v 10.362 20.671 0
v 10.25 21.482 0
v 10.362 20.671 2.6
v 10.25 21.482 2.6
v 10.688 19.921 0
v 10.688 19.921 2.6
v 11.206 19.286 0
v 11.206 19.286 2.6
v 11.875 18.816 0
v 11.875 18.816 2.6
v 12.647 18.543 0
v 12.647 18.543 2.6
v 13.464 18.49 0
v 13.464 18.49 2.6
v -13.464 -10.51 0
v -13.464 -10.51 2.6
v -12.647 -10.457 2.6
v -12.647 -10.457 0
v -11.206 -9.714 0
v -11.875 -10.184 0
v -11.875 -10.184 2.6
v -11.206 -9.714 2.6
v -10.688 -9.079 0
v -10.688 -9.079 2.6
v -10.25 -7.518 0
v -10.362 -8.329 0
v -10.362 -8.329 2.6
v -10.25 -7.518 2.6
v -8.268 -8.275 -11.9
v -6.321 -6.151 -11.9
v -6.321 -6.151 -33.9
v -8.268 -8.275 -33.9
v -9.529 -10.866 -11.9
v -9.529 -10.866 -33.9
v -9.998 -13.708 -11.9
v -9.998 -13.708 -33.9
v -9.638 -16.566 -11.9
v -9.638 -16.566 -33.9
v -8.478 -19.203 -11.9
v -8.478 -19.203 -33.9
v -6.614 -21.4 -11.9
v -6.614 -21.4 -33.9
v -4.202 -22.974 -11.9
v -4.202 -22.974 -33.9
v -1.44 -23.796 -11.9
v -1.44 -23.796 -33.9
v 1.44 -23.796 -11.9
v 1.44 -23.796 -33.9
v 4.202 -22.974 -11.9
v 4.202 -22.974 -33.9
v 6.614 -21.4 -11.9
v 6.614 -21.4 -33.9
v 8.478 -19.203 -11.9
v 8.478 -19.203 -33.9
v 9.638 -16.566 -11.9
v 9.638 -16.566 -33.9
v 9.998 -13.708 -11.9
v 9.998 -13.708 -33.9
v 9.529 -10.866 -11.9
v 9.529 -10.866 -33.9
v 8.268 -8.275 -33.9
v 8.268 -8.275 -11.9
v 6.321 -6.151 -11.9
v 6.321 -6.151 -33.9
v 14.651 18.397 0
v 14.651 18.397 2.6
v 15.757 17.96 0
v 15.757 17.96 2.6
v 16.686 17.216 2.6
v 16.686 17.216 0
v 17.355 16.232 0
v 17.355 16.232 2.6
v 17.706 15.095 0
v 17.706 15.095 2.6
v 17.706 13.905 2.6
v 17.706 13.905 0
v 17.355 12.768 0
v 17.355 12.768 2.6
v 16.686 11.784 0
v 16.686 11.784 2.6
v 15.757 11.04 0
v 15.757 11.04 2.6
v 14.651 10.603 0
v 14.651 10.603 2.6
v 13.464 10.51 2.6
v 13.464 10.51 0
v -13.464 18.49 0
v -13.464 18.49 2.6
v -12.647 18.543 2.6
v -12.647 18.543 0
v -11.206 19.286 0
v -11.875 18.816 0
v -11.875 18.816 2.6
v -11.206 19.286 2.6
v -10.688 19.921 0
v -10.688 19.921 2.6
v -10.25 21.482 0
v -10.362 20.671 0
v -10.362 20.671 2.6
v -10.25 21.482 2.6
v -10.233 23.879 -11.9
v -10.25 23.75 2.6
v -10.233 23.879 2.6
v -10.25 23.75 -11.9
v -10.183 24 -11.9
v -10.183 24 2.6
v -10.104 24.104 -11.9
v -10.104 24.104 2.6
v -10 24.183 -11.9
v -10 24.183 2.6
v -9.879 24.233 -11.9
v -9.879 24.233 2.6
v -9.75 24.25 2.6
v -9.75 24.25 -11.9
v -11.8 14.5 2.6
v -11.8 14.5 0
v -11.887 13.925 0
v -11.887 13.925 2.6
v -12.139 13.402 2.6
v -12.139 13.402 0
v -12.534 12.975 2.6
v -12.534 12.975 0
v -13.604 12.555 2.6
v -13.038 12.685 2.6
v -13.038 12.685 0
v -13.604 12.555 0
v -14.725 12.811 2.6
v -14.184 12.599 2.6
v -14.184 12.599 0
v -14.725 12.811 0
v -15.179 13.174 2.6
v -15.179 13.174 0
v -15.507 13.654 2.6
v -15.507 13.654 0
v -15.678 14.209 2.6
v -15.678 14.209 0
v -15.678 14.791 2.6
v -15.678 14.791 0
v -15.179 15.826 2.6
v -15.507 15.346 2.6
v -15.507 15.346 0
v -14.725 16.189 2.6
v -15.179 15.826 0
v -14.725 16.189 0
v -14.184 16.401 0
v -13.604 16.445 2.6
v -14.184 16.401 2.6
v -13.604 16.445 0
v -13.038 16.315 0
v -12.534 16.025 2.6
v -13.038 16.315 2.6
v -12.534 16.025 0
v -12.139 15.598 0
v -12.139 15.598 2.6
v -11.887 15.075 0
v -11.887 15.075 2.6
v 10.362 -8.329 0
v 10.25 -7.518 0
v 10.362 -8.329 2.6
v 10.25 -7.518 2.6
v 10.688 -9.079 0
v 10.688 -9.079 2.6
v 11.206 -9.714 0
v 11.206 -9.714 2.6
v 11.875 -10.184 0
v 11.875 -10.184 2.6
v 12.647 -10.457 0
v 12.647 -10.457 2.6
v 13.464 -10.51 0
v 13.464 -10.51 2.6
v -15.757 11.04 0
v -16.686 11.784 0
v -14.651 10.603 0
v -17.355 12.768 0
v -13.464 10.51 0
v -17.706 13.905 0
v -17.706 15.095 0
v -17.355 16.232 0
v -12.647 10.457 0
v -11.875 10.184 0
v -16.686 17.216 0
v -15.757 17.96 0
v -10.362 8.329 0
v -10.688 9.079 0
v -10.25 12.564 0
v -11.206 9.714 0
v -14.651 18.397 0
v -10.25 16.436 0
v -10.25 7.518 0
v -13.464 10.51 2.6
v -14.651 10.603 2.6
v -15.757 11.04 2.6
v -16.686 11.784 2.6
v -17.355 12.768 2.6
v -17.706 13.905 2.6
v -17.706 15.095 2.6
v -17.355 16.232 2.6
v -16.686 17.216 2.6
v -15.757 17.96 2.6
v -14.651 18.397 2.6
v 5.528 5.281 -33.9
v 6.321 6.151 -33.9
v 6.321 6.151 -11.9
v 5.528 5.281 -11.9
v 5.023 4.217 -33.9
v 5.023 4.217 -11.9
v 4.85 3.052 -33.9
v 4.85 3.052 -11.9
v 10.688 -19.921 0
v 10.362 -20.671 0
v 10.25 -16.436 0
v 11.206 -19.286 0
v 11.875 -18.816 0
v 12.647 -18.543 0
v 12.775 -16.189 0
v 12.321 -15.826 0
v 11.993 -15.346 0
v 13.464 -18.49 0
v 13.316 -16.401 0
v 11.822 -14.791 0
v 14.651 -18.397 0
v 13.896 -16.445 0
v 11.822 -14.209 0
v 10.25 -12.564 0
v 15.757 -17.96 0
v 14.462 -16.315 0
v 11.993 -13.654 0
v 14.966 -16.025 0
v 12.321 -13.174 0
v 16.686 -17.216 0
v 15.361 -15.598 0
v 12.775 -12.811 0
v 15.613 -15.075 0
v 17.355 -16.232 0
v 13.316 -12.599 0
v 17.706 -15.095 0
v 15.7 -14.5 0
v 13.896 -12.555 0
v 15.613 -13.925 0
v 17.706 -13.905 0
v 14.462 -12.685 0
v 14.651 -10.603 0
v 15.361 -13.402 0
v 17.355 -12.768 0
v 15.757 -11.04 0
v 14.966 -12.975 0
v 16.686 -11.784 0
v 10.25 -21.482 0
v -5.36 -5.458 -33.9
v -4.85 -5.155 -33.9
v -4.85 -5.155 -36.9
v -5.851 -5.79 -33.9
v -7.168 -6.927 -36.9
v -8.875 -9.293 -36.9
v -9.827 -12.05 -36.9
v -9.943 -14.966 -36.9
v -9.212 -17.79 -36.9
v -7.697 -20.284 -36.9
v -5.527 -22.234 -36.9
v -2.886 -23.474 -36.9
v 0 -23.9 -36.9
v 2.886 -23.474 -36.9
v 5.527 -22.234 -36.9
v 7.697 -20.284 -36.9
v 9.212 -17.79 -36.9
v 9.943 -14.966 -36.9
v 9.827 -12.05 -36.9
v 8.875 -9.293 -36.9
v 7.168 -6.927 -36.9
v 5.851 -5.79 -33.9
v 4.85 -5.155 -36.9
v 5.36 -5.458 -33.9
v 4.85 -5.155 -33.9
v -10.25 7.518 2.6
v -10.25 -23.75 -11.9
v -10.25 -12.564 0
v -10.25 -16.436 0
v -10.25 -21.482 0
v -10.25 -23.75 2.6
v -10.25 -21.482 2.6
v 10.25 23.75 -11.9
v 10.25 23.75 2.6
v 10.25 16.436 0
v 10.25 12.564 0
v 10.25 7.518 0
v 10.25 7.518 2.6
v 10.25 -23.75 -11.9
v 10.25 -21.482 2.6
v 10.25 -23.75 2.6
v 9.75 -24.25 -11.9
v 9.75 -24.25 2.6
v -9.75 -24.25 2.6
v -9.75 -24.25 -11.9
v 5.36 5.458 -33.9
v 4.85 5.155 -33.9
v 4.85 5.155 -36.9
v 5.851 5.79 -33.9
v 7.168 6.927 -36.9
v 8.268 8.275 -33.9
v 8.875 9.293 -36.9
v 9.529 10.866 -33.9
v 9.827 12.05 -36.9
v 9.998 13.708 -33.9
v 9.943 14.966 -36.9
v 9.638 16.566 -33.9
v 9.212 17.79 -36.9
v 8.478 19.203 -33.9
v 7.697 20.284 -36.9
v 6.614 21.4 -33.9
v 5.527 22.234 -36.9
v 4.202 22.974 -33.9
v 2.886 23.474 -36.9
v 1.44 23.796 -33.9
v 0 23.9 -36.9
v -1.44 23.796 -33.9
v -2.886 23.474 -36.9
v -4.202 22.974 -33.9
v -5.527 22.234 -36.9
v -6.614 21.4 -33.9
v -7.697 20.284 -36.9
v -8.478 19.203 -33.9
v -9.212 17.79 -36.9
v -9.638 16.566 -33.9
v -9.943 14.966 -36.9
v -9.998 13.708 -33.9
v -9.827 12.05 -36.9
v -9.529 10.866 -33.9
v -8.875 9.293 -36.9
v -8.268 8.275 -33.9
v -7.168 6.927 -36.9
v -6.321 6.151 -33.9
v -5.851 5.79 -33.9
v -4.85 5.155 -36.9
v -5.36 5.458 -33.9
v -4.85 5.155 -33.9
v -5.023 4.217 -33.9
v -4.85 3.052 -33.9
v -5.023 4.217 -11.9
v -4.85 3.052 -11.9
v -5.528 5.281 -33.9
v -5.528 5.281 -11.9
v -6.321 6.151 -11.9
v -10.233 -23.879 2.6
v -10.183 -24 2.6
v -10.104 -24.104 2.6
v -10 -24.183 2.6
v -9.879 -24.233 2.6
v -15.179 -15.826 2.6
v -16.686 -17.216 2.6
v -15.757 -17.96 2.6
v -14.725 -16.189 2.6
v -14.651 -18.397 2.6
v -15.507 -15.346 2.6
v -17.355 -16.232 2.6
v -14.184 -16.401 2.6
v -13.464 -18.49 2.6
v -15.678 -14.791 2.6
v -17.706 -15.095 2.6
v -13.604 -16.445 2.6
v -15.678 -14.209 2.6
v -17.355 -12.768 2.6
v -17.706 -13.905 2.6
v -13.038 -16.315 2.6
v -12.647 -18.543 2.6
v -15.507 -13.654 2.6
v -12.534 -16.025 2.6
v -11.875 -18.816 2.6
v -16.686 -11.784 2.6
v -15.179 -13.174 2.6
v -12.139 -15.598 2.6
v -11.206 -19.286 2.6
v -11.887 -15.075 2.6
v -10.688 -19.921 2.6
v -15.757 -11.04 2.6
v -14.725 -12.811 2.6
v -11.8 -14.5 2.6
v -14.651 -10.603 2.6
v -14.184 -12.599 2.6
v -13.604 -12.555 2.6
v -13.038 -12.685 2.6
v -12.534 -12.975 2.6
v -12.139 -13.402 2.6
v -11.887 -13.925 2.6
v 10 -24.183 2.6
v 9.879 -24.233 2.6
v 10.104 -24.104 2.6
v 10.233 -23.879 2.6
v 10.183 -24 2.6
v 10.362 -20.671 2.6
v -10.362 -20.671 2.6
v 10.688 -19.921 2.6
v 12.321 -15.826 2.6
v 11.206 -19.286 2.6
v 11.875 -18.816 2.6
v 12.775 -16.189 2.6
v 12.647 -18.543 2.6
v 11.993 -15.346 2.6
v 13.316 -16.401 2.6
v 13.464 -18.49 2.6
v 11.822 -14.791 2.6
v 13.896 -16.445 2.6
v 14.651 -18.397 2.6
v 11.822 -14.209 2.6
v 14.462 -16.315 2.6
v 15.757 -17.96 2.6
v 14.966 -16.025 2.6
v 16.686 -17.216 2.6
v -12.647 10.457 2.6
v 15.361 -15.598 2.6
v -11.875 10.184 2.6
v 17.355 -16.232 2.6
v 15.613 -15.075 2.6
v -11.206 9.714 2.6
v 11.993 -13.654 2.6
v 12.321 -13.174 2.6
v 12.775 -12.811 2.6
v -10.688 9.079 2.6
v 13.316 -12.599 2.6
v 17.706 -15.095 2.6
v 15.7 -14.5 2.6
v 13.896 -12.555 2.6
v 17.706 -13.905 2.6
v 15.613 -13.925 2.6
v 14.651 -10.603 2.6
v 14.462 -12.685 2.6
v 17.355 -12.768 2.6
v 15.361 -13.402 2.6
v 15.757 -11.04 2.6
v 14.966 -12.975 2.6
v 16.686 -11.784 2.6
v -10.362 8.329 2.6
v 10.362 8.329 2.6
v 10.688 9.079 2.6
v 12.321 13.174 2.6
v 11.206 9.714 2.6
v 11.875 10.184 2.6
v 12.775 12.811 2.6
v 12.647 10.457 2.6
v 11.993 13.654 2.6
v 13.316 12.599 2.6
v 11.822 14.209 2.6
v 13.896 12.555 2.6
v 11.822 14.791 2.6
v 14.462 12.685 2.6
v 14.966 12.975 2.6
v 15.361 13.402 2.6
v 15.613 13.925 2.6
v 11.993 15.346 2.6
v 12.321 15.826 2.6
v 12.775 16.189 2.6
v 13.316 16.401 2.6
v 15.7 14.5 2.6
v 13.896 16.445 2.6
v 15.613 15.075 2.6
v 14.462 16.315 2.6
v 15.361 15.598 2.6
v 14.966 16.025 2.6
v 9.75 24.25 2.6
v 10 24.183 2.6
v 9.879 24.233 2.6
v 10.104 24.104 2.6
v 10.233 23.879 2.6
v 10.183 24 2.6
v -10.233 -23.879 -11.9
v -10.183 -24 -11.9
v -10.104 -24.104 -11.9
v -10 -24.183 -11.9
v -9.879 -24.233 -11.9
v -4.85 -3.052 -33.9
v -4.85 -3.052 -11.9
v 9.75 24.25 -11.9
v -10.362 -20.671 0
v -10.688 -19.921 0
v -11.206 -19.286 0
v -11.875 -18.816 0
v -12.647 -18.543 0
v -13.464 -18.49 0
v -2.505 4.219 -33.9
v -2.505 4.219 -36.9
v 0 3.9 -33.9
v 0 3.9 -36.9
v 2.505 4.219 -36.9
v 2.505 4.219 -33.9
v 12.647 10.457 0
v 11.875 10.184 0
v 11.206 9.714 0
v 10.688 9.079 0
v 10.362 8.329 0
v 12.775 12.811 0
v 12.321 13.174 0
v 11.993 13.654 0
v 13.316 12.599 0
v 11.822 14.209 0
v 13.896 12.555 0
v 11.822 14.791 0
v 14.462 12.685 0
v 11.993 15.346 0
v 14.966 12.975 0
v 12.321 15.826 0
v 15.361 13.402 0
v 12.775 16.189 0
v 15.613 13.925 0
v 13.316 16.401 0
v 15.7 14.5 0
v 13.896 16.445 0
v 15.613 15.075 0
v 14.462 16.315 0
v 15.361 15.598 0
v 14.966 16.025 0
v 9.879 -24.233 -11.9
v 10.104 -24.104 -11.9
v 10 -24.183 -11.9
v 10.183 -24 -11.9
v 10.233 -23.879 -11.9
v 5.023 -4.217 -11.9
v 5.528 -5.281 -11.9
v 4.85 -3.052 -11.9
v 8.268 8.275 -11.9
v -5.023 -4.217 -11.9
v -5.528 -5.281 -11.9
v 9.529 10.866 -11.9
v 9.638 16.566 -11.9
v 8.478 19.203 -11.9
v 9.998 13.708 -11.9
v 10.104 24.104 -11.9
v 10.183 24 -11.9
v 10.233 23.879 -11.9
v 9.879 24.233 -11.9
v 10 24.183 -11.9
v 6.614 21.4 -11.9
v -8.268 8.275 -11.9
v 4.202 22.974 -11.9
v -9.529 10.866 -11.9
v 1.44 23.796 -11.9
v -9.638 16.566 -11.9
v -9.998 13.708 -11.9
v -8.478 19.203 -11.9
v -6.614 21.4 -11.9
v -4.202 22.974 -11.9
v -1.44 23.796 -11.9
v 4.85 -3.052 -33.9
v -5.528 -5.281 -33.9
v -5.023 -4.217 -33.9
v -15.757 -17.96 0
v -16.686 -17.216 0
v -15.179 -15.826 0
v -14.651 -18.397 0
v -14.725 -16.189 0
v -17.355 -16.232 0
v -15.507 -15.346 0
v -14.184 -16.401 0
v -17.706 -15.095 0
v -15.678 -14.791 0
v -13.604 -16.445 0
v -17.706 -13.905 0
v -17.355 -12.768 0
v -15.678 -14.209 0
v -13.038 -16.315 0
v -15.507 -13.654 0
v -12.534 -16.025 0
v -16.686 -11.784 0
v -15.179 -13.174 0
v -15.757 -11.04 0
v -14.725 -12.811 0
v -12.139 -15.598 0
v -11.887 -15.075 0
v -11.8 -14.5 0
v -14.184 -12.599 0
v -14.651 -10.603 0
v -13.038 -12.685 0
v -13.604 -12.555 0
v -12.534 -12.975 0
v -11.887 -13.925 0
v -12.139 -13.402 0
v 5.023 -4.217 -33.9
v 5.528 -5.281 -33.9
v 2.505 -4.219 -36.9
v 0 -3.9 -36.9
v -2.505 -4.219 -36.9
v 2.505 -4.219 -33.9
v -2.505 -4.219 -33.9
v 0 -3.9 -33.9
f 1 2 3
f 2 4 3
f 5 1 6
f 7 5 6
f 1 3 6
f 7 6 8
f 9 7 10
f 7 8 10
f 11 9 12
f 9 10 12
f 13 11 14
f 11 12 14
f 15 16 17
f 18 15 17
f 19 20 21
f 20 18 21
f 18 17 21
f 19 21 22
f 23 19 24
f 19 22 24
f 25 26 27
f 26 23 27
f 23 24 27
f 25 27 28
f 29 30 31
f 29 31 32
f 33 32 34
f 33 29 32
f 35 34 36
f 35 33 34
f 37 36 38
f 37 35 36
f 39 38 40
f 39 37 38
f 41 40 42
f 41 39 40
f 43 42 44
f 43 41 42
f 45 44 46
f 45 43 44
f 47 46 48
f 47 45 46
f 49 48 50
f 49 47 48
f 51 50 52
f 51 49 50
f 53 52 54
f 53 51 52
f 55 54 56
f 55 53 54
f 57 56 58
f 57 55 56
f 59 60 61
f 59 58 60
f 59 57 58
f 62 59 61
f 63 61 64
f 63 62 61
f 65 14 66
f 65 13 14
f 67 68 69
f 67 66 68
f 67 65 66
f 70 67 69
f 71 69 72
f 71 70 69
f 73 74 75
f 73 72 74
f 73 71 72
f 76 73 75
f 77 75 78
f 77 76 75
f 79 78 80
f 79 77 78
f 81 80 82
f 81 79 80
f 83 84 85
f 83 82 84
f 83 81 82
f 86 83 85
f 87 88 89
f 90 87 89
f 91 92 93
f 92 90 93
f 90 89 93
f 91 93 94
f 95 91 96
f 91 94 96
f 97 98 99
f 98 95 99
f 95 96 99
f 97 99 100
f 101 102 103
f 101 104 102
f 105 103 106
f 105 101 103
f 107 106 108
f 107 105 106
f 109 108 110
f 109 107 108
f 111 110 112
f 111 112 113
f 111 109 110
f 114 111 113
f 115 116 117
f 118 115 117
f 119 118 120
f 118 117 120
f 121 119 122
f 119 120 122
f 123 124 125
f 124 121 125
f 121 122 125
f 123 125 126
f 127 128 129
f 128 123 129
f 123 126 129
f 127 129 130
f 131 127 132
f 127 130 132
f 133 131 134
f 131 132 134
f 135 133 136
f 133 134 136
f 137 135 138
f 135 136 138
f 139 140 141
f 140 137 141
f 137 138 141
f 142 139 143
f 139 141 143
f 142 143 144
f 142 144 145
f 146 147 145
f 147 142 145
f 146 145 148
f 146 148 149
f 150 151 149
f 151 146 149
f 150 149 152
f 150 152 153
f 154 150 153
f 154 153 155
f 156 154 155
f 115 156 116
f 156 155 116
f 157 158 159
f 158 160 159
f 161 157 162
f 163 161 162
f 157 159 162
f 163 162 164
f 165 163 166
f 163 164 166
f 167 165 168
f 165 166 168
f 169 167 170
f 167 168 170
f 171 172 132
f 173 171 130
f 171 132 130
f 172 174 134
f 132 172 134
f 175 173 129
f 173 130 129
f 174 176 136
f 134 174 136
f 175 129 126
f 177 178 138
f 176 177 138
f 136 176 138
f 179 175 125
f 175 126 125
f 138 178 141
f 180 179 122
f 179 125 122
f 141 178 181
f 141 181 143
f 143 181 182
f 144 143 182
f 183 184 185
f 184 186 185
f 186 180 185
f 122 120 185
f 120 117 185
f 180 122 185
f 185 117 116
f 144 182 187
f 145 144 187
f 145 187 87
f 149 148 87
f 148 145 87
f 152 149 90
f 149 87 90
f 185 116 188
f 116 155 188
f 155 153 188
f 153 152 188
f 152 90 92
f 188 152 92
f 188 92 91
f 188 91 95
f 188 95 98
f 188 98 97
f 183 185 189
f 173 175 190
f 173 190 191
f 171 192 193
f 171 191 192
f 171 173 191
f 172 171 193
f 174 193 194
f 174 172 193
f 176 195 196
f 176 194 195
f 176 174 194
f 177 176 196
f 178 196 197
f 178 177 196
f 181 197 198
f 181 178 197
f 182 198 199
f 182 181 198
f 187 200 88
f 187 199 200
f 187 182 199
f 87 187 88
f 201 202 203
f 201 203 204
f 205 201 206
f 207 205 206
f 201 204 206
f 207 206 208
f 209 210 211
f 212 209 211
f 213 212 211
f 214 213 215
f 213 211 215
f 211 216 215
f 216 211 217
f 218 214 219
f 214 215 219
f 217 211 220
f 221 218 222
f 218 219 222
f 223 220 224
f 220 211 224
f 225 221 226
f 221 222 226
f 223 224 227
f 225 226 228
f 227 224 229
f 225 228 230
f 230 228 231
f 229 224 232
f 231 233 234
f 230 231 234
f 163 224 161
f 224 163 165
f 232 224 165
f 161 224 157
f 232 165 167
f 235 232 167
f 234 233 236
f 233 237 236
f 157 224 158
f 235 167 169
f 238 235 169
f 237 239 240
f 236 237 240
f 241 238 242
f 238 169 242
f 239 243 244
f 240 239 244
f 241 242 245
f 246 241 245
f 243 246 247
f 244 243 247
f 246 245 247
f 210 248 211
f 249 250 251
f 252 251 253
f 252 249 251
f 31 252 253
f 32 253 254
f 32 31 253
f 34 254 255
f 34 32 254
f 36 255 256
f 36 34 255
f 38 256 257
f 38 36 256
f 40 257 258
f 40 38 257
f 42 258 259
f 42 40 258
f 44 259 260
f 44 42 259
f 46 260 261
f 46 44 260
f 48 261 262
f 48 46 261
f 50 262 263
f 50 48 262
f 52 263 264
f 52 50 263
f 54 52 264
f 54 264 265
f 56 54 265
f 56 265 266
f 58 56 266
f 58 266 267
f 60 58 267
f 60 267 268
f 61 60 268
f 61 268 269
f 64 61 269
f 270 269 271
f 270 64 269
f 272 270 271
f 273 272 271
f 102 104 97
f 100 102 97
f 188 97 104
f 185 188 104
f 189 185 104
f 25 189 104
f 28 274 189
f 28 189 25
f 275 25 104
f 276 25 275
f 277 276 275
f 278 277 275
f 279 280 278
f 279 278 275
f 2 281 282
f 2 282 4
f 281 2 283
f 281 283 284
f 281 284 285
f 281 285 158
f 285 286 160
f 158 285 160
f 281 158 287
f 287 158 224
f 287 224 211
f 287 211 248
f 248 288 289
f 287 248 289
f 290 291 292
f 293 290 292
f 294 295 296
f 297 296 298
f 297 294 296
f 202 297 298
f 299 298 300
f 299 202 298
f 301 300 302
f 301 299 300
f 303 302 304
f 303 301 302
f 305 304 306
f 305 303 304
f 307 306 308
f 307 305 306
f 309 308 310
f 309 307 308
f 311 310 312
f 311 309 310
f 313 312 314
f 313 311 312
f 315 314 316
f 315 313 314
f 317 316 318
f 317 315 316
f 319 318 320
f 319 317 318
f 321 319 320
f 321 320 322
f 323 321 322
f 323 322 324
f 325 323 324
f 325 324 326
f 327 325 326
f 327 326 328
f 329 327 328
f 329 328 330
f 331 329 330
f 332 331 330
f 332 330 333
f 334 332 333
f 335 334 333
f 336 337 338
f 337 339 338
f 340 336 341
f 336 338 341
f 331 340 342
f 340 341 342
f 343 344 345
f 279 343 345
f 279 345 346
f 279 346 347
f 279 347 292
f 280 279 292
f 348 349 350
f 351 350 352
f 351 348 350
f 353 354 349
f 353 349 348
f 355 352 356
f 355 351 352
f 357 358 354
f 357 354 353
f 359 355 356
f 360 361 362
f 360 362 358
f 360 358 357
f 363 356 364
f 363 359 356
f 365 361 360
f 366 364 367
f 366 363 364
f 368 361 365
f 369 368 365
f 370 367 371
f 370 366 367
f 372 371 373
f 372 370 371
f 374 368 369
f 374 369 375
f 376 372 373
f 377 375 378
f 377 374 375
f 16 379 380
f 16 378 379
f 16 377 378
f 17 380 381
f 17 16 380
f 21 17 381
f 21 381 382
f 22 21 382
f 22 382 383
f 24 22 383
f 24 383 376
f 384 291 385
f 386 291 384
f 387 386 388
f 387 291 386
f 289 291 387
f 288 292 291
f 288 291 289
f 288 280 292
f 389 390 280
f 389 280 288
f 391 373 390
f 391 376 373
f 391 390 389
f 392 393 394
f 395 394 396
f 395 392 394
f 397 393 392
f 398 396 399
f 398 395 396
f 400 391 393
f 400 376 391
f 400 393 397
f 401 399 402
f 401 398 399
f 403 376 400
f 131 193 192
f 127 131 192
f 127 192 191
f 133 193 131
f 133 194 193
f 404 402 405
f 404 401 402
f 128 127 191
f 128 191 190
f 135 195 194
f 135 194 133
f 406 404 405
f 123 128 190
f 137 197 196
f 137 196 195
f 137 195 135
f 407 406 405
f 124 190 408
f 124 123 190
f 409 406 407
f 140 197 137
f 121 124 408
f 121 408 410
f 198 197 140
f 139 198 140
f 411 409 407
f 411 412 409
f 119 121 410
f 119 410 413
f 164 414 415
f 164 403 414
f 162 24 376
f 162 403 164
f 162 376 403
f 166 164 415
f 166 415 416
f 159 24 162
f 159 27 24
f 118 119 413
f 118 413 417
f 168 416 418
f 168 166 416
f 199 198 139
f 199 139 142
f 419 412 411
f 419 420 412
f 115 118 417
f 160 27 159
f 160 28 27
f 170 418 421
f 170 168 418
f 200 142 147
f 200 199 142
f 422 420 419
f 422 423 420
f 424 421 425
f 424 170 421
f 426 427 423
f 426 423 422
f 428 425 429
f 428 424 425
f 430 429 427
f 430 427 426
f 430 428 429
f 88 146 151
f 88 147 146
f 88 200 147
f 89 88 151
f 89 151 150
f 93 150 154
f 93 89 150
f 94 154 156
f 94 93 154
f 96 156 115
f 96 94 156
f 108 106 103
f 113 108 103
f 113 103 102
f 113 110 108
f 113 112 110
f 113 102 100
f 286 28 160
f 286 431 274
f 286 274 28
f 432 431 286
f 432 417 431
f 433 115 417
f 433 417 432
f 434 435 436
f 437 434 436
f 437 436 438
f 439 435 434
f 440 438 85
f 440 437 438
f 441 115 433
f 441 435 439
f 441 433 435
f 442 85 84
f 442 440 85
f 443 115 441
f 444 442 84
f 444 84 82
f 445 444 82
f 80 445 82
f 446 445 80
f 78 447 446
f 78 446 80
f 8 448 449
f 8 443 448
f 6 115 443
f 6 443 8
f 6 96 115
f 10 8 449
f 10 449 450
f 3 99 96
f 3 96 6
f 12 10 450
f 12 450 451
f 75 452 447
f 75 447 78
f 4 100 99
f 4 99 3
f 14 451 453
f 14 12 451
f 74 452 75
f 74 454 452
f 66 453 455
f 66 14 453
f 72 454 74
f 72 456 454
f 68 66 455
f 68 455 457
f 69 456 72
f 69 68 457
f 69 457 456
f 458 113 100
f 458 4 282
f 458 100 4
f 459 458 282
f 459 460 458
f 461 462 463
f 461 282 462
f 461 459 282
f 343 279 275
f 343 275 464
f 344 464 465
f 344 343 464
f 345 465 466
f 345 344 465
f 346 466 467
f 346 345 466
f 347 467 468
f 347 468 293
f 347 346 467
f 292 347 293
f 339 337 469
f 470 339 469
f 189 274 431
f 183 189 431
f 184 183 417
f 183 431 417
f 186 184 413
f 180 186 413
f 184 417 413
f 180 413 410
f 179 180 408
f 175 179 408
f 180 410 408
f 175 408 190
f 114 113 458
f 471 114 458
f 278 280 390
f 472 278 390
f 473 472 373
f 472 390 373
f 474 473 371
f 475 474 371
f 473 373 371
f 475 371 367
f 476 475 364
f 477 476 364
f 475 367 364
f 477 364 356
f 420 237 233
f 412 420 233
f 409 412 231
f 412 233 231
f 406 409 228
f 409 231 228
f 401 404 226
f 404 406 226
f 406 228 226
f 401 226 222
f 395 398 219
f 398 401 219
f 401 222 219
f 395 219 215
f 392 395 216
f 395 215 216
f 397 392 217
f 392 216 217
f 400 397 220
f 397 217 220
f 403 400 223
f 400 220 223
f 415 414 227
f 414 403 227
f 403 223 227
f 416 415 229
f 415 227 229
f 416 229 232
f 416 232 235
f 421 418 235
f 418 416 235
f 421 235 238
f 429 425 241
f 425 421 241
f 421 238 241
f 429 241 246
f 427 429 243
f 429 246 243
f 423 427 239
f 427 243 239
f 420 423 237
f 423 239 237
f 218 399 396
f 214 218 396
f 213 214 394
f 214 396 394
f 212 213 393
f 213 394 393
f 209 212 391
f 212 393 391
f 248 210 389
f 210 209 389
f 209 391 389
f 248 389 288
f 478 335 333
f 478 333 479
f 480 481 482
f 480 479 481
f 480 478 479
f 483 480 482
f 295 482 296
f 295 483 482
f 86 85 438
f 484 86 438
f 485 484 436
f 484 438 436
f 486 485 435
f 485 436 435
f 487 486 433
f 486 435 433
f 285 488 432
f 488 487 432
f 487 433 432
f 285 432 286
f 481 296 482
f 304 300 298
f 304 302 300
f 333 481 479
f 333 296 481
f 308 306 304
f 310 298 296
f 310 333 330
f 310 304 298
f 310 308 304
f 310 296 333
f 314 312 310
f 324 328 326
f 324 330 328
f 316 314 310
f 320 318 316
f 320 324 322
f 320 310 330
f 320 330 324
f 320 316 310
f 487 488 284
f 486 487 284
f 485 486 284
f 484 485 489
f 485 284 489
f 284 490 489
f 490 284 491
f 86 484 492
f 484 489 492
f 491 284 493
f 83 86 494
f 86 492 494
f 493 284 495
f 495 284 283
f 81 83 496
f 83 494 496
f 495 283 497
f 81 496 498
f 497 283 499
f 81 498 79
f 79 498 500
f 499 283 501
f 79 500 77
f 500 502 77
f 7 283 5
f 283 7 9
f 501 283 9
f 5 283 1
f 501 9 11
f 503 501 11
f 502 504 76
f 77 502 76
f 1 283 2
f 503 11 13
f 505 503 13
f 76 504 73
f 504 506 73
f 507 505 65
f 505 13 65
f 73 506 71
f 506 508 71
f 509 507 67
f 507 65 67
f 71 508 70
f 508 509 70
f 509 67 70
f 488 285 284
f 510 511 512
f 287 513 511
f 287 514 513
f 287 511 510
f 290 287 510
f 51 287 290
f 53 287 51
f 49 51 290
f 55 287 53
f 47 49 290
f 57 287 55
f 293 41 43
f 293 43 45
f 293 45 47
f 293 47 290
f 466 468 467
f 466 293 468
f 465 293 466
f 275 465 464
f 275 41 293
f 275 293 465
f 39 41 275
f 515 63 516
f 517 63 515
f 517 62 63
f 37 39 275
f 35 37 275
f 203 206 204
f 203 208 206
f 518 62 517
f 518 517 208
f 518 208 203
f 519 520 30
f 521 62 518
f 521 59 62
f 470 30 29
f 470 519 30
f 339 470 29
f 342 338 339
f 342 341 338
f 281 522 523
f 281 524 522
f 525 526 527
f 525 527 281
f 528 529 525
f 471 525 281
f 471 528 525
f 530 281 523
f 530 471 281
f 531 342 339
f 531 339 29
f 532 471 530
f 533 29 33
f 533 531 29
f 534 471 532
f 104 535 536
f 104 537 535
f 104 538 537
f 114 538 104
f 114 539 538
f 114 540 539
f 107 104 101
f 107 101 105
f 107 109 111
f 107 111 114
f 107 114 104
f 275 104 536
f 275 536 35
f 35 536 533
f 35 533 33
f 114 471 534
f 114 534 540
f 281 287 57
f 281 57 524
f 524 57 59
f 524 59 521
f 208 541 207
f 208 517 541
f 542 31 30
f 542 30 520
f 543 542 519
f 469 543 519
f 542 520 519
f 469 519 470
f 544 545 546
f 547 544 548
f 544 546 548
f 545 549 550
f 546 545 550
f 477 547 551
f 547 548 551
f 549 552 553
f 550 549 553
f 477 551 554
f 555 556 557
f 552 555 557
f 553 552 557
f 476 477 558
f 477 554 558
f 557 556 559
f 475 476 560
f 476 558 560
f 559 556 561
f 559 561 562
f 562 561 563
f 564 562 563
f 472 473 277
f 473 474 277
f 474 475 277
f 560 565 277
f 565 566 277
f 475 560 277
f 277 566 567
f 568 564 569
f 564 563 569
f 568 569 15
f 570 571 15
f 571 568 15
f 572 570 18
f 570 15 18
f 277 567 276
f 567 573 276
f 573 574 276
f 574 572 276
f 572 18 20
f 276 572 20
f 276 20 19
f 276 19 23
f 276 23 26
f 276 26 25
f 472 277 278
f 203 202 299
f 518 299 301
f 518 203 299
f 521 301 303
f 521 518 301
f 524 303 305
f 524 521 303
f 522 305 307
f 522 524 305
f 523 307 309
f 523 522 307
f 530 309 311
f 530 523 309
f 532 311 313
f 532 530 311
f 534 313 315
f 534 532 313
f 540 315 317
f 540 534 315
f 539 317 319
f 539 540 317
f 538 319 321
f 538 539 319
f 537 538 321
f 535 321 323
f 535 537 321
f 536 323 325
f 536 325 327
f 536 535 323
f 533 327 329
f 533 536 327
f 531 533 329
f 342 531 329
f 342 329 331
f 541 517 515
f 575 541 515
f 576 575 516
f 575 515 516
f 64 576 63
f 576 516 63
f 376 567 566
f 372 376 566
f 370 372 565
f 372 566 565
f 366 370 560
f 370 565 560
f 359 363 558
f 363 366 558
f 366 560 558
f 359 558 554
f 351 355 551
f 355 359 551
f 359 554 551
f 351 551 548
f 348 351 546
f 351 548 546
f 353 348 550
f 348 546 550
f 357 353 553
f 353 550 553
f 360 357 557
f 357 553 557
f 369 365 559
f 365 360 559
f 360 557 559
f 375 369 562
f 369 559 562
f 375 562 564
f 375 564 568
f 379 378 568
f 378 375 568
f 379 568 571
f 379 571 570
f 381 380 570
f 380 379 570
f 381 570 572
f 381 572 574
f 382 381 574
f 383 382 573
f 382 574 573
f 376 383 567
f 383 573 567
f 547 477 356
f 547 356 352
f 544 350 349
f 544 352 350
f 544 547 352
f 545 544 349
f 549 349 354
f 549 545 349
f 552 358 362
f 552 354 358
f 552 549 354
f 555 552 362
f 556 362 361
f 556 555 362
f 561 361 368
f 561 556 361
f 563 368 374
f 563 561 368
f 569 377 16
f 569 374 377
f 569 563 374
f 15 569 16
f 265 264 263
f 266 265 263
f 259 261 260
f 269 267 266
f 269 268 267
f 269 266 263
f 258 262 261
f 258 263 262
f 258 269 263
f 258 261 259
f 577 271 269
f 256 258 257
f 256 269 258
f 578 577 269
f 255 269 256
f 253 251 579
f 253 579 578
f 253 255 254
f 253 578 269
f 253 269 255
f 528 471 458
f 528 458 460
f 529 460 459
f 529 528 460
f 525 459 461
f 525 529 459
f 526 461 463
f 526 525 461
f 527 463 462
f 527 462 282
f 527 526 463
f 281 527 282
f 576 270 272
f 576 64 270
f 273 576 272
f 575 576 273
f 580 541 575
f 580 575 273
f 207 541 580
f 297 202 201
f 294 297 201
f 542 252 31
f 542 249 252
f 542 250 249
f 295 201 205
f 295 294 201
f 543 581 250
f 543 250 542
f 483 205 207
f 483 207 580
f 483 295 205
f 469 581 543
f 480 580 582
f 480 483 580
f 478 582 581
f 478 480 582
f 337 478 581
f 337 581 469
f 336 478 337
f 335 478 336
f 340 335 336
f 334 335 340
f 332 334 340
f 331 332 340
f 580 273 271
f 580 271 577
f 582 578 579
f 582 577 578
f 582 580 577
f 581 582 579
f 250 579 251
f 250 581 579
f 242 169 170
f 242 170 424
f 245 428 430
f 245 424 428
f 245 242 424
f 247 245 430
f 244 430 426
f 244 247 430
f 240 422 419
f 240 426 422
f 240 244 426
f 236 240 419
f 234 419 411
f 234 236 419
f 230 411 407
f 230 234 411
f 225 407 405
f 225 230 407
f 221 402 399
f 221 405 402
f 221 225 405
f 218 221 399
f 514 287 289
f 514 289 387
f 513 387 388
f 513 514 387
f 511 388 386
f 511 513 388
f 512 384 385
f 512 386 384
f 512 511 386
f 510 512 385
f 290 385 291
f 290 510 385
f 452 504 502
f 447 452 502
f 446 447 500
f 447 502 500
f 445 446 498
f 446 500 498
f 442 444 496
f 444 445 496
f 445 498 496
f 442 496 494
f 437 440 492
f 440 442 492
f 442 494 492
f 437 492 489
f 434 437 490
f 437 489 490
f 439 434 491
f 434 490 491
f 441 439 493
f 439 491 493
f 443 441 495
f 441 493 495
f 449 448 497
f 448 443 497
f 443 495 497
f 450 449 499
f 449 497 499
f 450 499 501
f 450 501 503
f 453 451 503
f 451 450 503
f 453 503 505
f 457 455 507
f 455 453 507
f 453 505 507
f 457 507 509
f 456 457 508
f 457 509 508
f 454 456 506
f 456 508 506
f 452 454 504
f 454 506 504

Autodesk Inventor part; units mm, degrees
ref_plane "YZ Plane" through (0, 0, 0) normal (1, 0, 0) x (0, 1, 0)
ref_plane "XZ Plane" through (0, 0, 0) normal (0, 1, 0) x (-1, 0, 0)
ref_plane "XY Plane" through (0, 0, 0) normal (0, 0, 1) x (1, 0, 0)
sketch "Sketch1" plane through (0, 0, 0) normal (0, 0, 1) x (1, 0, 0)
  line L0 (10.25, 24.25) -> (10.25, -24.25) projected
  line L1 (-10.25, 24.25) -> (10.25, 24.25) projected
  line L2 (-10.25, -24.25) -> (-10.25, -9) projected
  line L3 (-10.25, 9) -> (-10.25, 24.25) projected
  line L4 (10.25, -24.25) -> (-10.25, -24.25) projected
  circle A0 centre (13.75, -14.5) radius 1.95 projected
  circle A1 centre (13.75, 14.5) radius 1.95 projected
  circle A2 centre (-13.75, 14.5) radius 1.95 projected
  circle A3 centre (-13.75, -14.5) radius 1.95 projected
  line L5 (-10.25, 9) -> (-10.25, -9)
  arc A4 (10.25, 12.5635) -> (10.25, 16.4365) centre (13.75, 14.5) ccw
  arc A5 (10.25, -16.4365) -> (10.25, -12.5635) centre (13.75, -14.5) ccw
  arc A6 (-10.25, -12.5635) -> (-10.25, -16.4365) centre (-13.75, -14.5) ccw
  arc A7 (-10.25, 16.4365) -> (-10.25, 12.5635) centre (-13.75, 14.5) ccw
  point P0 (0, 0)
  dimension "d0" = 8
  dimension "d1" = 8
  dimension "d2" = 8
  dimension "d3" = 8
extrude "Extrusion1" add sketch "Sketch1" along normal blind 2.6
sketch "Sketch2" plane through (0, 0, 0) normal (0, 0, -1) x (-1, 0, 0)
  line L0 (10.25, 24.25) -> (10.25, 16.4365) projected
  line L1 (-10.25, -24.25) -> (-10.25, -16.4365) projected
  line L2 (10.25, 24.25) -> (-10.25, 24.25)
  line L3 (-10.25, 24.25) -> (-10.25, -24.25)
  line L4 (-10.25, -24.25) -> (10.25, -24.25)
  line L5 (10.25, -24.25) -> (10.25, 24.25)
  point P0 (0, 0)
extrude "Extrusion2" add sketch "Sketch2" along normal blind 11.9
sketch "Sketch3" plane through (0, 0, -11.9) normal (0, 0, -1) x (-1, 0, 0)
  circle A0 centre (0, 13.9) radius 10 projected
  circle A1 centre (0, -13.9) radius 10 projected
  line L0 (4.85, 5.1549) -> (4.85, -5.1549)
  line L1 (-4.85, -5.1549) -> (-4.85, 5.1549)
  line L2 (-4.85, 7.8675) -> (4.85, -7.8675) construction
  line L3 (4.85, 7.8675) -> (-4.85, -7.8675) construction
  point P0 (0, 0)
  dimension "d8" = 9.7
extrude "Extrusion3" add sketch "Sketch3" along normal blind 22
sketch "Sketch4" plane through (0, 0, -33.9) normal (0, 0, -1) x (-1, 0, 0)
  arc A0 (4.85, 5.1549) -> (-4.85, 5.1549) centre (0, 13.9) ccw projected
  circle A1 centre (0, 13.9) radius 10
  arc A2 (-4.85, -5.1549) -> (4.85, -5.1549) centre (0, -13.9) ccw projected
  circle A3 centre (0, -13.9) radius 10
  point P0 (0, 0)
extrude "Extrusion4" add sketch "Sketch4" along normal blind 3
fillet "Fillet1" radius 4 4 edges at (-4.85, 5.1549, -22.9) (-4.85, -5.1549, -22.9) (4.85, -5.1549, -22.9) (4.85, 5.1549, -22.9)
fillet "Fillet2" radius 3 8 edges at (-10.25, -12.5635, 1.3) (-10.25, -16.4365, 1.3) (-10.25, 16.4365, 1.3) (-10.25, 12.5635, 1.3) (10.25, 12.5635, 1.3) (10.25, 16.4365, 1.3) (10.25, -16.4365, 1.3) (10.25, -12.5635, 1.3)
fillet "Fillet3" radius 0.5 4 edges at (-10.25, -24.25, -4.65) (10.25, -24.25, -4.65) (10.25, 24.25, -4.65) (-10.25, 24.25, -4.65)
properties part number "Side Lidar"
